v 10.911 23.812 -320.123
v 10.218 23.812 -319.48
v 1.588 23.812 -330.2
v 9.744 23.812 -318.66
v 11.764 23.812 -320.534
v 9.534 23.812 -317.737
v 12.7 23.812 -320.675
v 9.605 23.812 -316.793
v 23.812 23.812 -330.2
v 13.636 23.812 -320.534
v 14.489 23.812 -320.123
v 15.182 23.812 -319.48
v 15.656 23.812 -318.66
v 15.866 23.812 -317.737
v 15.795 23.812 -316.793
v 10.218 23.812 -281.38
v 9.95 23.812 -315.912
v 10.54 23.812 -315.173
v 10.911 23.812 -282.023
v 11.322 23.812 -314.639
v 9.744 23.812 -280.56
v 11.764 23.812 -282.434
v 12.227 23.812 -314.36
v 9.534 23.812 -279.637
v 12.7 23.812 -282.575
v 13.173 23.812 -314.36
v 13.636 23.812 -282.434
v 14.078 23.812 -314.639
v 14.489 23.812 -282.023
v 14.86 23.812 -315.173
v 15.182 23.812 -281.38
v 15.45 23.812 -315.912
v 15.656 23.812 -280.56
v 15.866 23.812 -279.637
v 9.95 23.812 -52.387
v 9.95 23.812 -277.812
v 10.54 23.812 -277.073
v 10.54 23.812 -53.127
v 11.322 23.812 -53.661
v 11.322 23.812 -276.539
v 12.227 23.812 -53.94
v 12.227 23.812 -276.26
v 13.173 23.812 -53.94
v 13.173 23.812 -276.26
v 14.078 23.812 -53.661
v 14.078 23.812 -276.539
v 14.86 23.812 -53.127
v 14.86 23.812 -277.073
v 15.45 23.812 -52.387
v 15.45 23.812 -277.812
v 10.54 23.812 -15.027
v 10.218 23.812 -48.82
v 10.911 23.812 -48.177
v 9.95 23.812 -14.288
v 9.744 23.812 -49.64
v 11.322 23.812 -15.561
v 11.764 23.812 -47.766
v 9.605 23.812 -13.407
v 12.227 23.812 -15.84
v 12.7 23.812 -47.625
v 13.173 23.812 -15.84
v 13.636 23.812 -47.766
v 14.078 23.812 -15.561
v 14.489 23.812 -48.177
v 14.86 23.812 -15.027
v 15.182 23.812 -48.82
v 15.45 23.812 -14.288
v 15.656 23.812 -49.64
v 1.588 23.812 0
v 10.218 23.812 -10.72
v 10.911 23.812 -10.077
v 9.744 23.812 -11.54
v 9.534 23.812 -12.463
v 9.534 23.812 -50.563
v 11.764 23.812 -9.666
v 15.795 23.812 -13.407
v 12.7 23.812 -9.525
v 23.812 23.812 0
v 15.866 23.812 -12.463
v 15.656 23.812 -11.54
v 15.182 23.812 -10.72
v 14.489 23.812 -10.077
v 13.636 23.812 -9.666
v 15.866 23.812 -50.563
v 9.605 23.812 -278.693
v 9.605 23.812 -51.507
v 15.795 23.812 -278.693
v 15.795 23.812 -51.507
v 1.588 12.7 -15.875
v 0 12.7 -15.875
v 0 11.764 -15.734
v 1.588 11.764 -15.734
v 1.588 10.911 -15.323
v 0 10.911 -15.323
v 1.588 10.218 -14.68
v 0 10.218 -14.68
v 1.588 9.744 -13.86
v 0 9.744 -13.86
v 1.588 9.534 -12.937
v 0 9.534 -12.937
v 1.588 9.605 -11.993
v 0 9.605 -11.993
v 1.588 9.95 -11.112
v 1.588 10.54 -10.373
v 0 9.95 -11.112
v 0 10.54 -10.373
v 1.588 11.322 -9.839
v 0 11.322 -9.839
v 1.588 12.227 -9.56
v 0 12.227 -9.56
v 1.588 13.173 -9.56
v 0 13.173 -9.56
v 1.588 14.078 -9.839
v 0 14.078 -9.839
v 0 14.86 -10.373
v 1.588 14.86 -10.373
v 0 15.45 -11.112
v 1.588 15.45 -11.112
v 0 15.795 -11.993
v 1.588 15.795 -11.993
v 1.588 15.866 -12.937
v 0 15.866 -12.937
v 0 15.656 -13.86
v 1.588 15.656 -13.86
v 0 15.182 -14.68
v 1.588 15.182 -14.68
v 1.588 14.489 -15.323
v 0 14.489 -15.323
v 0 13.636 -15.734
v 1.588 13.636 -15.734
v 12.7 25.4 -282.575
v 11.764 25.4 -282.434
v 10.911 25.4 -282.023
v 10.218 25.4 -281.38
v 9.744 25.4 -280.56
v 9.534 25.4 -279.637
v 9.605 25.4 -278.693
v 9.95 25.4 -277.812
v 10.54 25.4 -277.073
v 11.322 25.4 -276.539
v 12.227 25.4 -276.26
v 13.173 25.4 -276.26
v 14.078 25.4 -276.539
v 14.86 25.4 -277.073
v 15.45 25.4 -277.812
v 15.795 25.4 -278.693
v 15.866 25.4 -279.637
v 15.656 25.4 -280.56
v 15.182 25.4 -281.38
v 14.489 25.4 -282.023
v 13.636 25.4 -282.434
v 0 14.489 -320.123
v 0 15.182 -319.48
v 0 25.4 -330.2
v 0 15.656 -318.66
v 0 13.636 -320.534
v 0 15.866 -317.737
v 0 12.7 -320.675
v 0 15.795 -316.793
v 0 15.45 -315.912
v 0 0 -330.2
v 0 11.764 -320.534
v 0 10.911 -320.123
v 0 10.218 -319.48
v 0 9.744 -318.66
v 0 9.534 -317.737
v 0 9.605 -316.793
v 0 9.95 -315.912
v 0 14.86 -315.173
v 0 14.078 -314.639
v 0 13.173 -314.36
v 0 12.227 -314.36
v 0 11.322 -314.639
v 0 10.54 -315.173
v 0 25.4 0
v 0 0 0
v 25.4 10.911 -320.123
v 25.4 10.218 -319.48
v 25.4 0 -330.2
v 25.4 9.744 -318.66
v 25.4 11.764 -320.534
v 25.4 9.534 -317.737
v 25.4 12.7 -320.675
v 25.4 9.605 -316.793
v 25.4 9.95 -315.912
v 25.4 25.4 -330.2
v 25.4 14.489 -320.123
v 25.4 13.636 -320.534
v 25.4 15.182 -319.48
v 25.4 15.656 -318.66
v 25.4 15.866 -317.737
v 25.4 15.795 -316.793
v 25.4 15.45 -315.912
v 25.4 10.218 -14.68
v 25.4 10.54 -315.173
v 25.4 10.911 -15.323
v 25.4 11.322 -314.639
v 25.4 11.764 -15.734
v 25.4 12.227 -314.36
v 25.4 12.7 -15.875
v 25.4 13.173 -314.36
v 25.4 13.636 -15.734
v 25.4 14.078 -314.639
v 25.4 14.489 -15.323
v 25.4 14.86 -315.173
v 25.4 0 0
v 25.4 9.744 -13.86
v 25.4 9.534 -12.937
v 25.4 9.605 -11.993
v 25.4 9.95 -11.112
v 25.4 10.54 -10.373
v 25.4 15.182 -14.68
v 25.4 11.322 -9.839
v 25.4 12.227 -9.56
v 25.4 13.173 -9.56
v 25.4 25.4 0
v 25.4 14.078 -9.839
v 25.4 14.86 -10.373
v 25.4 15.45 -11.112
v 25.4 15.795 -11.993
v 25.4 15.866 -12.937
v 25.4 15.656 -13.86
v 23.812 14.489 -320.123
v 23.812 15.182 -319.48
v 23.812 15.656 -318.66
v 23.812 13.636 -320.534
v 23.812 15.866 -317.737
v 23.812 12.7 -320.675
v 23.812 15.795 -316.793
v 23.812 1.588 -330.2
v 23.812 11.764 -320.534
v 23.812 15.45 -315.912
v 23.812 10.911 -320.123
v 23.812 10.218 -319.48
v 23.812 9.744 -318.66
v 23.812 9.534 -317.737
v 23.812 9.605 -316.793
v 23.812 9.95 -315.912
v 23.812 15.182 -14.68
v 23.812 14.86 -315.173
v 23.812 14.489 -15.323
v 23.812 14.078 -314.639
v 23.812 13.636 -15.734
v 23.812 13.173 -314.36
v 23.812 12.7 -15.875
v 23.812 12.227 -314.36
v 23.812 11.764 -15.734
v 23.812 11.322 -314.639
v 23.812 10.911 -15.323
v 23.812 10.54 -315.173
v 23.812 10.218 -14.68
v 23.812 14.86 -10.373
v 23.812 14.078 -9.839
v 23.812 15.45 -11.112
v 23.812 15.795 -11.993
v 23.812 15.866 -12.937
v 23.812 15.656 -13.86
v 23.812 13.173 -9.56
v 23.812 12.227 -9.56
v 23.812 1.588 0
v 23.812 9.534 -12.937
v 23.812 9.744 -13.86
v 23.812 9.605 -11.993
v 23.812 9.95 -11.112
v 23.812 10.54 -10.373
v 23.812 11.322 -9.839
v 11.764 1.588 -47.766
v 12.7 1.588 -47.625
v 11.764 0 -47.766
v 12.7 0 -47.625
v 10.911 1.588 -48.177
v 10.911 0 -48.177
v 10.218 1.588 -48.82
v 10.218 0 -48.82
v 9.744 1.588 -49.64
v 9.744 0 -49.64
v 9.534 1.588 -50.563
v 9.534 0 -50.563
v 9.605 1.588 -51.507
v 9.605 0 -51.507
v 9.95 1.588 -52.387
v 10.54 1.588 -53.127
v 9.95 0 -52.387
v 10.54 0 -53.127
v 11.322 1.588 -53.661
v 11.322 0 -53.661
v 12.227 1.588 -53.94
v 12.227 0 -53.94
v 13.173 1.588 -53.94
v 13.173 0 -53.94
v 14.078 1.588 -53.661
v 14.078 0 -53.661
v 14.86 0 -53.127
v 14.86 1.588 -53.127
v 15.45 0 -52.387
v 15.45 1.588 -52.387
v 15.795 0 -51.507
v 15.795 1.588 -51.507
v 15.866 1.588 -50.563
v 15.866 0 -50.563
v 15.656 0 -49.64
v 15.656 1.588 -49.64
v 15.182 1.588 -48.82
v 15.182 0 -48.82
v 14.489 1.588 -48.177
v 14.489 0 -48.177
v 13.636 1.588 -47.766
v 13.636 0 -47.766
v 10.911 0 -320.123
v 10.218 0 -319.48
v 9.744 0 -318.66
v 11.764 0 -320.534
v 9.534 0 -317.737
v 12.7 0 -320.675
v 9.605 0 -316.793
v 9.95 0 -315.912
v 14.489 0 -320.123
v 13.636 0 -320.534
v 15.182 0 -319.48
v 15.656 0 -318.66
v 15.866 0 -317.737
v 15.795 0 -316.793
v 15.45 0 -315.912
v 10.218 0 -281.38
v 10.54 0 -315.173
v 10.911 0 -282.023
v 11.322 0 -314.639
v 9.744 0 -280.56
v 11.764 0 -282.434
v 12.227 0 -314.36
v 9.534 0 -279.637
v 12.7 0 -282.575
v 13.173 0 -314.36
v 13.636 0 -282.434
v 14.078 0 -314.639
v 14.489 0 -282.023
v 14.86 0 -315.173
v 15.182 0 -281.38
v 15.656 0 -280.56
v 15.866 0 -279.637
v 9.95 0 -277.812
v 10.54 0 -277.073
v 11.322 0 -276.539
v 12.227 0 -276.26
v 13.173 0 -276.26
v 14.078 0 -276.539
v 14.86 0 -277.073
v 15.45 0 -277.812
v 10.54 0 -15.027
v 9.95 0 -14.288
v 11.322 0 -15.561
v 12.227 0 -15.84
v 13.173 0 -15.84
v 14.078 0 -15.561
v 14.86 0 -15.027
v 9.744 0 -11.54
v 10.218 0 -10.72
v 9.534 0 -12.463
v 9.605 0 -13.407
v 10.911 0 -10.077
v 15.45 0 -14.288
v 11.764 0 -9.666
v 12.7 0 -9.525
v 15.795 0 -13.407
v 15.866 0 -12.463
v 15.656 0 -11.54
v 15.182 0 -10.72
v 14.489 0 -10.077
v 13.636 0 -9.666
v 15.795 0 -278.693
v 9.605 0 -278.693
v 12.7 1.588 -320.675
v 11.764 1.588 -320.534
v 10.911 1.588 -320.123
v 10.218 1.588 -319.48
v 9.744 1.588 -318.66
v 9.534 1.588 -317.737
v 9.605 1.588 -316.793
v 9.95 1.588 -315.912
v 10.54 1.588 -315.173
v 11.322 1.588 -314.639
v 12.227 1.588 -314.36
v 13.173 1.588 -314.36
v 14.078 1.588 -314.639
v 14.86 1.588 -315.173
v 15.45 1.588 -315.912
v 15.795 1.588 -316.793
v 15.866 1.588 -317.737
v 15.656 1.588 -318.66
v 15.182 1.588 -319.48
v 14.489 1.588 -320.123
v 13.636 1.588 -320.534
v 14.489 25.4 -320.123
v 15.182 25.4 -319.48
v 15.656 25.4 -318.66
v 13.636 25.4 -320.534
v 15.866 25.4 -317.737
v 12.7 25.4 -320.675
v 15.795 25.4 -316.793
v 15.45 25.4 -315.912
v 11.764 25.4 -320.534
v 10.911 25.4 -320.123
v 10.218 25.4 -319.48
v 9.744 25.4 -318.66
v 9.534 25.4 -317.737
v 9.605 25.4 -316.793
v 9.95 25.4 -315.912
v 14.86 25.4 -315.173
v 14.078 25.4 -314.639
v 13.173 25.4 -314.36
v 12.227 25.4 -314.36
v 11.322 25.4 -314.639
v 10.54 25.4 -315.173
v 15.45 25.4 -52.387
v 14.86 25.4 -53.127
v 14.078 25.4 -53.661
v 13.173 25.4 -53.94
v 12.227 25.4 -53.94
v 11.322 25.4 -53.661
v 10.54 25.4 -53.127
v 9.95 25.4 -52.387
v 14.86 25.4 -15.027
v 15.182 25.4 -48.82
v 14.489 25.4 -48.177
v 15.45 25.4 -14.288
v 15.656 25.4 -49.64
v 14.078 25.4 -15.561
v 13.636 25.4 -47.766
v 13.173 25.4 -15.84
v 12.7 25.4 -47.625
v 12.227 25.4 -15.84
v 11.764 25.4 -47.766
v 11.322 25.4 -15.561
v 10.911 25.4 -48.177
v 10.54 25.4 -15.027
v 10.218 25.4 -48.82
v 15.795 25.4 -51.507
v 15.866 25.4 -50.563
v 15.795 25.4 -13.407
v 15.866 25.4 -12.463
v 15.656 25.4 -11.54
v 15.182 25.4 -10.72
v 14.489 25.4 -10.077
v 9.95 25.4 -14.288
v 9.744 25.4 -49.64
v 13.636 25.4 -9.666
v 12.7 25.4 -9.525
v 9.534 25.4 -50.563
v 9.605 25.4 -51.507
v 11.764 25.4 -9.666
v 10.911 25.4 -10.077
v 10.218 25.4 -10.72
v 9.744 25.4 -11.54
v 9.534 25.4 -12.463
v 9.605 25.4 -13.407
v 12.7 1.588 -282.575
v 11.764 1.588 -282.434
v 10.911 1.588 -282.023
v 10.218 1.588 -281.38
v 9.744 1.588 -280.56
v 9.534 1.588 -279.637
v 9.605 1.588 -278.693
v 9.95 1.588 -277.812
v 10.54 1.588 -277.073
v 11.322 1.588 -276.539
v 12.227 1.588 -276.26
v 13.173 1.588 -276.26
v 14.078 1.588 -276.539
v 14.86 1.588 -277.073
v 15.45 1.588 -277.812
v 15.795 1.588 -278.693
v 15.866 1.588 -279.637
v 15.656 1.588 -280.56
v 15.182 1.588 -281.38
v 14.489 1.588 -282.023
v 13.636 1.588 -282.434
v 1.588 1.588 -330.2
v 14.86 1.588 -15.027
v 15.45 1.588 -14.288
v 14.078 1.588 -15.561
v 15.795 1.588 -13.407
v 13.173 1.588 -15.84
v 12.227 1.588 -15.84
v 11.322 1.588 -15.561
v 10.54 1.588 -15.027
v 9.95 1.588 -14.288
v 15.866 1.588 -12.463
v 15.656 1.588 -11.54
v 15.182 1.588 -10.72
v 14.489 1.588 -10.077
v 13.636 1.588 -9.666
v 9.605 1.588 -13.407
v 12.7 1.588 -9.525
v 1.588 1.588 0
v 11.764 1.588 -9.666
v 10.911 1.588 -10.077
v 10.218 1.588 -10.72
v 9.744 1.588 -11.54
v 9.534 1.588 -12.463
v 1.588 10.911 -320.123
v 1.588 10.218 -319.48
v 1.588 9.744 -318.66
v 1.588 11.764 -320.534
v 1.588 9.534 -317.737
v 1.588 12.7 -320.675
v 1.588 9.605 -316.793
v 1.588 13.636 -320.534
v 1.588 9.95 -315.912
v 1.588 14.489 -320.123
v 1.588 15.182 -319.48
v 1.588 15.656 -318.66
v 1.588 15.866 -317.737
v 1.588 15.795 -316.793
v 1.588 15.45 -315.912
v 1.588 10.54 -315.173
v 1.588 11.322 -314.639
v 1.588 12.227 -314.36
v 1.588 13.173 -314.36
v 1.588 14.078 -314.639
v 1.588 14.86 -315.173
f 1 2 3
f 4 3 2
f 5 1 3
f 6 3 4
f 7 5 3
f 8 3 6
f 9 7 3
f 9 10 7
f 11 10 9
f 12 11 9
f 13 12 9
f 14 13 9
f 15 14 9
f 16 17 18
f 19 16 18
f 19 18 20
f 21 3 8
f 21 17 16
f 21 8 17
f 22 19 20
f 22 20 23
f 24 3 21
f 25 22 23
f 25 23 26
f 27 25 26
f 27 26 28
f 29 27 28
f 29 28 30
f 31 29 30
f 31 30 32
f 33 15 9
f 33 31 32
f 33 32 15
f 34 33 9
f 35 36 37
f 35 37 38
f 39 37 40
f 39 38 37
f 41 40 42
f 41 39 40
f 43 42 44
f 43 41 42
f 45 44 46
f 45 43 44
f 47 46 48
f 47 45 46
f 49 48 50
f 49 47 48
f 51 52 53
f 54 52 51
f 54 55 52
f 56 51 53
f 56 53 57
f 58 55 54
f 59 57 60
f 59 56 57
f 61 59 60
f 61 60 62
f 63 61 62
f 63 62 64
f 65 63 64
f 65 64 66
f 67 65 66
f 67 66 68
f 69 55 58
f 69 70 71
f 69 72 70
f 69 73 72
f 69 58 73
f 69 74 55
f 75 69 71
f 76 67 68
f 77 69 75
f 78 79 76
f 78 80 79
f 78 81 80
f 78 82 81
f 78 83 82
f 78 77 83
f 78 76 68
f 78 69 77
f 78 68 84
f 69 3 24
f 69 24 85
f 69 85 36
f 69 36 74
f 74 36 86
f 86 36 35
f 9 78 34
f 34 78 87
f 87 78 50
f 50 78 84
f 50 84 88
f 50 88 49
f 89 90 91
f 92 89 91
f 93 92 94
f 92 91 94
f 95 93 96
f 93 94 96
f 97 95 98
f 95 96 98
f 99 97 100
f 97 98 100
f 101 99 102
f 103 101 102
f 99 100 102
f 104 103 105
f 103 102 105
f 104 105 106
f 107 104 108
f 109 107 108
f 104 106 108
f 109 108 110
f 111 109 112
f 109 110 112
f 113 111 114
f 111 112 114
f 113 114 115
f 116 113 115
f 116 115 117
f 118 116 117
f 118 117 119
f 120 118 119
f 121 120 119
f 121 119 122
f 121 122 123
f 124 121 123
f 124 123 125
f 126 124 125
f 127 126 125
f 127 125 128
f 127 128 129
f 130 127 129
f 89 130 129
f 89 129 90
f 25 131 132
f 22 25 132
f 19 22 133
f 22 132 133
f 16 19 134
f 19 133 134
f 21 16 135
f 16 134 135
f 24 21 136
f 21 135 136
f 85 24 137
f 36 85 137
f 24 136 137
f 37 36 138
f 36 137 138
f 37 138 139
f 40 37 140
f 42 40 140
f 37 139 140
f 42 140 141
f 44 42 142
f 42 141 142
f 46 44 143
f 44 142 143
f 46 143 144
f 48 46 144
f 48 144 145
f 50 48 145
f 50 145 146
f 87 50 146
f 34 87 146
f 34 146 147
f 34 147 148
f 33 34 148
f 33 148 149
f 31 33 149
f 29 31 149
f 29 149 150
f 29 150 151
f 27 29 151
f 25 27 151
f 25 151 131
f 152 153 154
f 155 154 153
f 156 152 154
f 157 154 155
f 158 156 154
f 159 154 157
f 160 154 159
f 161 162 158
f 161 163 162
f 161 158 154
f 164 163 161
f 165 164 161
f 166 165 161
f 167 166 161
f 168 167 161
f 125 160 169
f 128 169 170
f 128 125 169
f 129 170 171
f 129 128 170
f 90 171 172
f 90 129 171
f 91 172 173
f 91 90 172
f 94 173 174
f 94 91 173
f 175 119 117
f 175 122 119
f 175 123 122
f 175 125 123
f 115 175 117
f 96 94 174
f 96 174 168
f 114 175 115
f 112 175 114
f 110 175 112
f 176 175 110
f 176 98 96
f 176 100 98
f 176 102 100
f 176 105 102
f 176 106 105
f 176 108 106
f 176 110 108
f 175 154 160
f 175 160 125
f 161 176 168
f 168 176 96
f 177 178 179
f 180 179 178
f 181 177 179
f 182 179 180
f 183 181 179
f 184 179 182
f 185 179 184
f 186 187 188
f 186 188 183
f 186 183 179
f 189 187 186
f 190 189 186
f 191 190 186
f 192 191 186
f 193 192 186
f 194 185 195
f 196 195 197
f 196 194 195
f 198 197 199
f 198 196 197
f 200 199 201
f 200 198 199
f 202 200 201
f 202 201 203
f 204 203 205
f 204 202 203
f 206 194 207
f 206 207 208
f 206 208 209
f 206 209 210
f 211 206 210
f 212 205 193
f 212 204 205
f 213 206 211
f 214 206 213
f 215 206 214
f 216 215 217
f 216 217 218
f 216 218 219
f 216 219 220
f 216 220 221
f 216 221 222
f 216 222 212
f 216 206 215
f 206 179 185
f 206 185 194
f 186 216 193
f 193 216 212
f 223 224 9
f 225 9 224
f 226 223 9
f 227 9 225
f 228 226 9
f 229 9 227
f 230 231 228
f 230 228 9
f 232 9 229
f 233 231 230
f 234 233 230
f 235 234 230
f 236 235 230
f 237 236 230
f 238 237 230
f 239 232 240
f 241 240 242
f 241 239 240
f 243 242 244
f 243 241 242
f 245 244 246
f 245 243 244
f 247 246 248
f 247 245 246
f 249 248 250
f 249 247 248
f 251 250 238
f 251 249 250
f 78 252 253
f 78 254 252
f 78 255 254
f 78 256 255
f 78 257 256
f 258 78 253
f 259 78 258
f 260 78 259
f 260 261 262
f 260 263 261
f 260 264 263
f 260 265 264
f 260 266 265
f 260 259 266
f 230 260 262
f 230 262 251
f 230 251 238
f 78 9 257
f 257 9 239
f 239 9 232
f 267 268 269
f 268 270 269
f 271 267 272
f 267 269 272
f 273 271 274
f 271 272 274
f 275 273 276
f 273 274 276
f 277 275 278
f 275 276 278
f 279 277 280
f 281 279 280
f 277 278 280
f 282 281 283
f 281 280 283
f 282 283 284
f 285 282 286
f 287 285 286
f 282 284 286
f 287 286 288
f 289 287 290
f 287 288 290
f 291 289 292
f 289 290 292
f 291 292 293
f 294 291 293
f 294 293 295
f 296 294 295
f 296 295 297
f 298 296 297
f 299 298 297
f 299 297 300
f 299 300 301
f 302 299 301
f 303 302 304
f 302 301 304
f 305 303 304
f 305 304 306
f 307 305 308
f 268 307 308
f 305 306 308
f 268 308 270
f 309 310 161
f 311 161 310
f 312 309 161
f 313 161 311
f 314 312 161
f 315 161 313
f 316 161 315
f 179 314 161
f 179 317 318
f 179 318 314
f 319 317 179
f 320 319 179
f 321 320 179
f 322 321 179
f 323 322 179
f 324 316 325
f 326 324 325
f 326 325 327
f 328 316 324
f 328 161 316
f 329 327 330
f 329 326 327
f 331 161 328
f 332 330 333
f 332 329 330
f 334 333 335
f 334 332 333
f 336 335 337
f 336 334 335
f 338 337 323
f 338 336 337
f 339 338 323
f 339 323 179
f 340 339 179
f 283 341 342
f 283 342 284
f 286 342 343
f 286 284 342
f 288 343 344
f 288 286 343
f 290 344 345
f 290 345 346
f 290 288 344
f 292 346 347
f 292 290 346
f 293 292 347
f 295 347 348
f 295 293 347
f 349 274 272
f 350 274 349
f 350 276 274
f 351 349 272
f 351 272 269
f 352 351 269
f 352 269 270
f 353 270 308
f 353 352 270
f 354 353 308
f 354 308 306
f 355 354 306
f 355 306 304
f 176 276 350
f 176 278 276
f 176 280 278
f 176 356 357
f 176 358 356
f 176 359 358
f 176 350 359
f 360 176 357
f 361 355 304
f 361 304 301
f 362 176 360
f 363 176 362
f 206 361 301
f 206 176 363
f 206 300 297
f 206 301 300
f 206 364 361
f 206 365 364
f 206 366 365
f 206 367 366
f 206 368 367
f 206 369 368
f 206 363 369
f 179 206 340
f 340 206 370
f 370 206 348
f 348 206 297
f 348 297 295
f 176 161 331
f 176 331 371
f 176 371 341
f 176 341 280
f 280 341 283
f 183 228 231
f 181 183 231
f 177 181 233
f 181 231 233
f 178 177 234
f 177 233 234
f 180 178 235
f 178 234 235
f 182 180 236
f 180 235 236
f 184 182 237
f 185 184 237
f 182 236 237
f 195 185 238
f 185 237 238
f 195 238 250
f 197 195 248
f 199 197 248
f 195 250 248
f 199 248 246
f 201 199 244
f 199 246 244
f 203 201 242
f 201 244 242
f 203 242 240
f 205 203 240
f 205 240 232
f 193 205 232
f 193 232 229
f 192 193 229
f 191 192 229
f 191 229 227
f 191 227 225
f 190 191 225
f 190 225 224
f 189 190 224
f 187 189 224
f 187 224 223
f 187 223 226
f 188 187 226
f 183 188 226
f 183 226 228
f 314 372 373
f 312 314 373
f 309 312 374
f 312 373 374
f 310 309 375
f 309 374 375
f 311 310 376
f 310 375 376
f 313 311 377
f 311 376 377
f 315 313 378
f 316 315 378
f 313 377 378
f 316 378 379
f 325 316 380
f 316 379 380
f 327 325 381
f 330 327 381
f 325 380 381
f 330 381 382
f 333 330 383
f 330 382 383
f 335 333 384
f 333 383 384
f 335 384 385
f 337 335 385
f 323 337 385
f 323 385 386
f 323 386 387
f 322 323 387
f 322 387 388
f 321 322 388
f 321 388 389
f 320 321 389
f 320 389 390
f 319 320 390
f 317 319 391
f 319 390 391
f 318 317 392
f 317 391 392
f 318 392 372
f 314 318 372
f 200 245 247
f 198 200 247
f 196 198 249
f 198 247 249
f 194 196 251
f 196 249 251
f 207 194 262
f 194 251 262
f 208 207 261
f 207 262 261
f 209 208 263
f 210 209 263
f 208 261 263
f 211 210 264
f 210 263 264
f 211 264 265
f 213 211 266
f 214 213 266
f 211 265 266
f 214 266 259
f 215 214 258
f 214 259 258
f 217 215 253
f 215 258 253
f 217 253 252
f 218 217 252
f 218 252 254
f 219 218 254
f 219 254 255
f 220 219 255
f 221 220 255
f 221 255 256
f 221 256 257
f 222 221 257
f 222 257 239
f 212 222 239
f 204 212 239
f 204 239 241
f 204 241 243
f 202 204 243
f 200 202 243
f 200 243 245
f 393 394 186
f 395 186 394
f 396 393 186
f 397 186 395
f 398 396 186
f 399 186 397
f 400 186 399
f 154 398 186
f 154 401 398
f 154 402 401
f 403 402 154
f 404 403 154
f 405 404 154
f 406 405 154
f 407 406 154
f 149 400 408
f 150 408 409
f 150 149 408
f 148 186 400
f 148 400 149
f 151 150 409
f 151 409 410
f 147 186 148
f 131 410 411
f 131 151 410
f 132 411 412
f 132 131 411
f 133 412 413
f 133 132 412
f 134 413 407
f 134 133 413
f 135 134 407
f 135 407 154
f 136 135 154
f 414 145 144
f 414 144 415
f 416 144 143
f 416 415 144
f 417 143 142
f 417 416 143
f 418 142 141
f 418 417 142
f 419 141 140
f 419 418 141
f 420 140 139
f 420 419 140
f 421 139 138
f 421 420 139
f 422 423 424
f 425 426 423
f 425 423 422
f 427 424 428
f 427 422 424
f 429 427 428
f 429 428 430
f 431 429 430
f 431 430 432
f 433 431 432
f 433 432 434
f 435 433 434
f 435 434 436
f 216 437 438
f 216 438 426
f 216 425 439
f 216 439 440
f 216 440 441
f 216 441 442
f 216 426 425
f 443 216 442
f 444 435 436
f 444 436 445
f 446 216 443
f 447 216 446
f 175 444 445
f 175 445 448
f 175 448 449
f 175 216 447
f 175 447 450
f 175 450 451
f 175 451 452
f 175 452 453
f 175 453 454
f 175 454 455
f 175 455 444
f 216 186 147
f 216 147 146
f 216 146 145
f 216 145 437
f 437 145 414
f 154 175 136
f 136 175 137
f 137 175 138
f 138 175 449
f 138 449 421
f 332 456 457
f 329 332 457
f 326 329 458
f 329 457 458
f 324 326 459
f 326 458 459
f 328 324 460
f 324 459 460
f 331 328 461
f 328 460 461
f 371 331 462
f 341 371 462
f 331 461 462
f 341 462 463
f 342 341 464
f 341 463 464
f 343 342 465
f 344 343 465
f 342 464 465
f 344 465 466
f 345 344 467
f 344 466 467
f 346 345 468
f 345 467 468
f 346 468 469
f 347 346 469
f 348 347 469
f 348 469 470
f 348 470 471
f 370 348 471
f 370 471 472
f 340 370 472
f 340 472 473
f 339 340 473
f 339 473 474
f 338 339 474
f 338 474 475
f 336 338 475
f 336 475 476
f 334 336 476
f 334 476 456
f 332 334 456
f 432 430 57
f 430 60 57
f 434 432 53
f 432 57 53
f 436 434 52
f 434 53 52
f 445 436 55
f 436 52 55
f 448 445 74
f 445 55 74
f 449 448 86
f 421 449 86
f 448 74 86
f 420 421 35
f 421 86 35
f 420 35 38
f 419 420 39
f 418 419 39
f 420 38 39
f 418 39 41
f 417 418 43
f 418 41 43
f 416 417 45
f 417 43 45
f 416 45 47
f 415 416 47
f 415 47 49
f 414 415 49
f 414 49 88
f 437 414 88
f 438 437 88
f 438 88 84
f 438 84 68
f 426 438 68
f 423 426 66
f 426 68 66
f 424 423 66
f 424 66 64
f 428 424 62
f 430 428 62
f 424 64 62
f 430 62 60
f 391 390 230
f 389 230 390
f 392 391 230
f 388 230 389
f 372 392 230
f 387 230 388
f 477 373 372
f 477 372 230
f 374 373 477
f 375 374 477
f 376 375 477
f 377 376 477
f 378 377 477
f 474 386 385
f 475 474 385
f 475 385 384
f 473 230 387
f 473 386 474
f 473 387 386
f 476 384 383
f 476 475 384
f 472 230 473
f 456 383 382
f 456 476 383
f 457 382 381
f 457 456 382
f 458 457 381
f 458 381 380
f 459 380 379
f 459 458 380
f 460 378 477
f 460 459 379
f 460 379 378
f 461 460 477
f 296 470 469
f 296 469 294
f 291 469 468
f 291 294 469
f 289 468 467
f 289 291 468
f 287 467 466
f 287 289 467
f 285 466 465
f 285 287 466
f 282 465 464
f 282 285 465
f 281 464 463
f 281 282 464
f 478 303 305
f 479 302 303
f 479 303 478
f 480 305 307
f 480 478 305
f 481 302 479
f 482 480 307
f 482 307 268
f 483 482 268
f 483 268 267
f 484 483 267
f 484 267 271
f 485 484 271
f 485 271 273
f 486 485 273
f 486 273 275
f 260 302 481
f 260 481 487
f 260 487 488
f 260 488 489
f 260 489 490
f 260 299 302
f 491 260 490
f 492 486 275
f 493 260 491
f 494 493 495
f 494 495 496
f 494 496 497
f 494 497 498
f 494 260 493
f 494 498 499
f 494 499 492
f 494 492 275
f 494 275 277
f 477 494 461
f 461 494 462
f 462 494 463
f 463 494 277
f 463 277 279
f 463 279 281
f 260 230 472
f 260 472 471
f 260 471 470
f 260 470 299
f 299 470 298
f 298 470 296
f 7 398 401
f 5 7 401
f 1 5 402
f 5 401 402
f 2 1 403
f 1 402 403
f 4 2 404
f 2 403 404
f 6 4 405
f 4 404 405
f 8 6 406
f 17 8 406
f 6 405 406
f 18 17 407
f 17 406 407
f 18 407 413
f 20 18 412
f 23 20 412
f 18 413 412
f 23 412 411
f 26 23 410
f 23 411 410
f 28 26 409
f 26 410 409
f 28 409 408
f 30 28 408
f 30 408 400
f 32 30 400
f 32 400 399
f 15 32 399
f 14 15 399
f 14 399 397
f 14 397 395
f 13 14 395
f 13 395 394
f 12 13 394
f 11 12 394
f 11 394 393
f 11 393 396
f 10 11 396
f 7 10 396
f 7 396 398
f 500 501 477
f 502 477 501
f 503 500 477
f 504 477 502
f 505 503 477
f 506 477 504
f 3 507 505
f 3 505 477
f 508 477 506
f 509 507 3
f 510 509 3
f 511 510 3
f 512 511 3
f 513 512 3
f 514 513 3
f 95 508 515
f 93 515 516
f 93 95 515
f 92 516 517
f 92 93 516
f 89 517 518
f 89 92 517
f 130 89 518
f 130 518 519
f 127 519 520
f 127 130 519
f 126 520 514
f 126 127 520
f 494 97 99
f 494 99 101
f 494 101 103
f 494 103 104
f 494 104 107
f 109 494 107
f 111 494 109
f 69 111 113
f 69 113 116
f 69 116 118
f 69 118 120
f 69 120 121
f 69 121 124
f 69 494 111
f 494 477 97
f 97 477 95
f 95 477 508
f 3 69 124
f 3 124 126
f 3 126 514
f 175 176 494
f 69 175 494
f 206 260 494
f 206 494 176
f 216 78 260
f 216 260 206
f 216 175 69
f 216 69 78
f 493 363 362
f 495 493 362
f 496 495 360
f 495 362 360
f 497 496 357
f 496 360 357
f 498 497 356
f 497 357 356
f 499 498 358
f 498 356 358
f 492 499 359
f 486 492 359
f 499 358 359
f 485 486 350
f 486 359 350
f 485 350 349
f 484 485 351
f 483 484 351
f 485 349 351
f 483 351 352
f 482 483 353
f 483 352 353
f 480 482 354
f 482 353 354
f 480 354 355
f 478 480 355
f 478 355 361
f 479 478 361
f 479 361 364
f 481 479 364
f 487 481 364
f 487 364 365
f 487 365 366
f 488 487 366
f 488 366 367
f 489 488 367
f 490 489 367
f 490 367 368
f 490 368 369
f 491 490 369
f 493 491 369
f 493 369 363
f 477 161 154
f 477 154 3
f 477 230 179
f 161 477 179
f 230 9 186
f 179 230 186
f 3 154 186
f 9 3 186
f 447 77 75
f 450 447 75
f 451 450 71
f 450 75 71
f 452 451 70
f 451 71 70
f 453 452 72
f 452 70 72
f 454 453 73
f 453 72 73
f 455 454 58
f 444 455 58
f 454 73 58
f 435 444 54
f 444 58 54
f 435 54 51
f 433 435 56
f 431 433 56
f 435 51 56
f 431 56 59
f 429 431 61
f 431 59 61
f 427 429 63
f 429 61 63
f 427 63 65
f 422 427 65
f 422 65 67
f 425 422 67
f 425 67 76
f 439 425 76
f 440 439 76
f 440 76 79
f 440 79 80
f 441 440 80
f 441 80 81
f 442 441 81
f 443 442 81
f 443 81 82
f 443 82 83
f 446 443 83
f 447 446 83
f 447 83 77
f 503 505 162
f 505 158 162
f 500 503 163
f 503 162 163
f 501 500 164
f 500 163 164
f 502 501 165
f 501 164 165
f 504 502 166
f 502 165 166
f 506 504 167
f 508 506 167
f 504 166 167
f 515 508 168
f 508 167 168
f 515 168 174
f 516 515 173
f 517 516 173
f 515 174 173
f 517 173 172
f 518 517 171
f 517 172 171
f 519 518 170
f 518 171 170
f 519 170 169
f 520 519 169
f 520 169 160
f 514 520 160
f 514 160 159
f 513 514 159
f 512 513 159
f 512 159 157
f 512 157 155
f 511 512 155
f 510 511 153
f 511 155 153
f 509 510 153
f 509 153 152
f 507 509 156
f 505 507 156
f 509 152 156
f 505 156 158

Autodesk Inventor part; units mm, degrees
ref_plane "YZ Plane" through (0, 0, 0) normal (1, 0, 0) x (0, 1, 0)
ref_plane "XZ Plane" through (0, 0, 0) normal (0, 1, 0) x (-1, 0, 0)
ref_plane "XY Plane" through (0, 0, 0) normal (0, 0, 1) x (1, 0, 0)
sketch "Sketch1" plane through (0, 0, 0) normal (0, 0, 1) x (1, 0, 0)
  line L0 (0, 0) -> (25.4, 0)
  line L1 (25.4, 0) -> (25.4, 25.4)
  line L2 (25.4, 25.4) -> (0, 25.4)
  line L3 (0, 25.4) -> (0, 0)
  line L4 (1.5875, 23.8125) -> (23.8125, 23.8125)
  line L5 (23.8125, 23.8125) -> (23.8125, 1.5875)
  line L6 (23.8125, 1.5875) -> (1.5875, 1.5875)
  line L7 (1.5875, 1.5875) -> (1.5875, 23.8125)
  dimension "d0" = 25.4
  dimension "d1" = 25.4
  dimension "d2" = 1.5875
extrude "Extrusion1" add sketch "Sketch1" against normal blind 330.2
sketch "Sketch2" plane through (0, 0, 0) normal (0, -1, 0) x (1, 0, 0)
  line L0 (0, -330.2) -> (25.4, -330.2) projected
  point P0 (12.7, -317.5)
  point P1 (12.7, -279.4)
  dimension "d5" = 38.1
  dimension "d6" = 12.7
hole "Hole1" at (12.7, 0, -317.5) at (12.7, 0, -279.4) direction (0, 1, 0) diameter 6.35 depth 25.4 tip angle 118
sketch "Sketch3" plane through (0, 25.4, 0) normal (0, 1, 0) x (1, 0, 0)
  line L0 (0, 0) -> (0, 330.2) projected
  line L1 (25.4, 0) -> (0, 0) projected
  point P0 (12.7, 12.7)
  dimension "d25" = 12.7
  dimension "d26" = 12.7
sketch "Sketch4" plane through (25.4, 0, 0) normal (1, 0, 0) x (0, 0, -1)
  line L0 (330.2, 0) -> (330.2, 25.4) projected
  line L1 (0, 25.4) -> (330.2, 25.4) projected
  line L2 (0, 0) -> (0, 25.4) projected
  point P0 (317.5, 12.7)
  point P1 (12.7, 12.7)
  dimension "d14" = 12.7
  dimension "d15" = 12.7
  dimension "d16" = 12.7
  dimension "d17" = 12.7
hole "Hole2" at (25.4, 12.7, -12.7) at (25.4, 12.7, -317.5) direction (-1, 0, 0) diameter 6.35 depth 25.4 tip angle 118
hole "Hole3" at (12.7, 25.4, -12.7) direction (0, -1, 0) diameter 6.35 depth 25.4 tip angle 118
sketch "Sketch5" plane through (0, 25.4, 0) normal (0, 1, 0) x (1, 0, 0)
  line L0 (25.4, 0) -> (0, 0) projected
  point P0 (12.7, 50.8)
  dimension "d34" = 50.8
hole "Hole4" at (12.7, 25.4, -50.8) direction (0, -1, 0) diameter 6.35 depth 50.8 tip angle 118
properties part number "1tube_13_layer2_side"
